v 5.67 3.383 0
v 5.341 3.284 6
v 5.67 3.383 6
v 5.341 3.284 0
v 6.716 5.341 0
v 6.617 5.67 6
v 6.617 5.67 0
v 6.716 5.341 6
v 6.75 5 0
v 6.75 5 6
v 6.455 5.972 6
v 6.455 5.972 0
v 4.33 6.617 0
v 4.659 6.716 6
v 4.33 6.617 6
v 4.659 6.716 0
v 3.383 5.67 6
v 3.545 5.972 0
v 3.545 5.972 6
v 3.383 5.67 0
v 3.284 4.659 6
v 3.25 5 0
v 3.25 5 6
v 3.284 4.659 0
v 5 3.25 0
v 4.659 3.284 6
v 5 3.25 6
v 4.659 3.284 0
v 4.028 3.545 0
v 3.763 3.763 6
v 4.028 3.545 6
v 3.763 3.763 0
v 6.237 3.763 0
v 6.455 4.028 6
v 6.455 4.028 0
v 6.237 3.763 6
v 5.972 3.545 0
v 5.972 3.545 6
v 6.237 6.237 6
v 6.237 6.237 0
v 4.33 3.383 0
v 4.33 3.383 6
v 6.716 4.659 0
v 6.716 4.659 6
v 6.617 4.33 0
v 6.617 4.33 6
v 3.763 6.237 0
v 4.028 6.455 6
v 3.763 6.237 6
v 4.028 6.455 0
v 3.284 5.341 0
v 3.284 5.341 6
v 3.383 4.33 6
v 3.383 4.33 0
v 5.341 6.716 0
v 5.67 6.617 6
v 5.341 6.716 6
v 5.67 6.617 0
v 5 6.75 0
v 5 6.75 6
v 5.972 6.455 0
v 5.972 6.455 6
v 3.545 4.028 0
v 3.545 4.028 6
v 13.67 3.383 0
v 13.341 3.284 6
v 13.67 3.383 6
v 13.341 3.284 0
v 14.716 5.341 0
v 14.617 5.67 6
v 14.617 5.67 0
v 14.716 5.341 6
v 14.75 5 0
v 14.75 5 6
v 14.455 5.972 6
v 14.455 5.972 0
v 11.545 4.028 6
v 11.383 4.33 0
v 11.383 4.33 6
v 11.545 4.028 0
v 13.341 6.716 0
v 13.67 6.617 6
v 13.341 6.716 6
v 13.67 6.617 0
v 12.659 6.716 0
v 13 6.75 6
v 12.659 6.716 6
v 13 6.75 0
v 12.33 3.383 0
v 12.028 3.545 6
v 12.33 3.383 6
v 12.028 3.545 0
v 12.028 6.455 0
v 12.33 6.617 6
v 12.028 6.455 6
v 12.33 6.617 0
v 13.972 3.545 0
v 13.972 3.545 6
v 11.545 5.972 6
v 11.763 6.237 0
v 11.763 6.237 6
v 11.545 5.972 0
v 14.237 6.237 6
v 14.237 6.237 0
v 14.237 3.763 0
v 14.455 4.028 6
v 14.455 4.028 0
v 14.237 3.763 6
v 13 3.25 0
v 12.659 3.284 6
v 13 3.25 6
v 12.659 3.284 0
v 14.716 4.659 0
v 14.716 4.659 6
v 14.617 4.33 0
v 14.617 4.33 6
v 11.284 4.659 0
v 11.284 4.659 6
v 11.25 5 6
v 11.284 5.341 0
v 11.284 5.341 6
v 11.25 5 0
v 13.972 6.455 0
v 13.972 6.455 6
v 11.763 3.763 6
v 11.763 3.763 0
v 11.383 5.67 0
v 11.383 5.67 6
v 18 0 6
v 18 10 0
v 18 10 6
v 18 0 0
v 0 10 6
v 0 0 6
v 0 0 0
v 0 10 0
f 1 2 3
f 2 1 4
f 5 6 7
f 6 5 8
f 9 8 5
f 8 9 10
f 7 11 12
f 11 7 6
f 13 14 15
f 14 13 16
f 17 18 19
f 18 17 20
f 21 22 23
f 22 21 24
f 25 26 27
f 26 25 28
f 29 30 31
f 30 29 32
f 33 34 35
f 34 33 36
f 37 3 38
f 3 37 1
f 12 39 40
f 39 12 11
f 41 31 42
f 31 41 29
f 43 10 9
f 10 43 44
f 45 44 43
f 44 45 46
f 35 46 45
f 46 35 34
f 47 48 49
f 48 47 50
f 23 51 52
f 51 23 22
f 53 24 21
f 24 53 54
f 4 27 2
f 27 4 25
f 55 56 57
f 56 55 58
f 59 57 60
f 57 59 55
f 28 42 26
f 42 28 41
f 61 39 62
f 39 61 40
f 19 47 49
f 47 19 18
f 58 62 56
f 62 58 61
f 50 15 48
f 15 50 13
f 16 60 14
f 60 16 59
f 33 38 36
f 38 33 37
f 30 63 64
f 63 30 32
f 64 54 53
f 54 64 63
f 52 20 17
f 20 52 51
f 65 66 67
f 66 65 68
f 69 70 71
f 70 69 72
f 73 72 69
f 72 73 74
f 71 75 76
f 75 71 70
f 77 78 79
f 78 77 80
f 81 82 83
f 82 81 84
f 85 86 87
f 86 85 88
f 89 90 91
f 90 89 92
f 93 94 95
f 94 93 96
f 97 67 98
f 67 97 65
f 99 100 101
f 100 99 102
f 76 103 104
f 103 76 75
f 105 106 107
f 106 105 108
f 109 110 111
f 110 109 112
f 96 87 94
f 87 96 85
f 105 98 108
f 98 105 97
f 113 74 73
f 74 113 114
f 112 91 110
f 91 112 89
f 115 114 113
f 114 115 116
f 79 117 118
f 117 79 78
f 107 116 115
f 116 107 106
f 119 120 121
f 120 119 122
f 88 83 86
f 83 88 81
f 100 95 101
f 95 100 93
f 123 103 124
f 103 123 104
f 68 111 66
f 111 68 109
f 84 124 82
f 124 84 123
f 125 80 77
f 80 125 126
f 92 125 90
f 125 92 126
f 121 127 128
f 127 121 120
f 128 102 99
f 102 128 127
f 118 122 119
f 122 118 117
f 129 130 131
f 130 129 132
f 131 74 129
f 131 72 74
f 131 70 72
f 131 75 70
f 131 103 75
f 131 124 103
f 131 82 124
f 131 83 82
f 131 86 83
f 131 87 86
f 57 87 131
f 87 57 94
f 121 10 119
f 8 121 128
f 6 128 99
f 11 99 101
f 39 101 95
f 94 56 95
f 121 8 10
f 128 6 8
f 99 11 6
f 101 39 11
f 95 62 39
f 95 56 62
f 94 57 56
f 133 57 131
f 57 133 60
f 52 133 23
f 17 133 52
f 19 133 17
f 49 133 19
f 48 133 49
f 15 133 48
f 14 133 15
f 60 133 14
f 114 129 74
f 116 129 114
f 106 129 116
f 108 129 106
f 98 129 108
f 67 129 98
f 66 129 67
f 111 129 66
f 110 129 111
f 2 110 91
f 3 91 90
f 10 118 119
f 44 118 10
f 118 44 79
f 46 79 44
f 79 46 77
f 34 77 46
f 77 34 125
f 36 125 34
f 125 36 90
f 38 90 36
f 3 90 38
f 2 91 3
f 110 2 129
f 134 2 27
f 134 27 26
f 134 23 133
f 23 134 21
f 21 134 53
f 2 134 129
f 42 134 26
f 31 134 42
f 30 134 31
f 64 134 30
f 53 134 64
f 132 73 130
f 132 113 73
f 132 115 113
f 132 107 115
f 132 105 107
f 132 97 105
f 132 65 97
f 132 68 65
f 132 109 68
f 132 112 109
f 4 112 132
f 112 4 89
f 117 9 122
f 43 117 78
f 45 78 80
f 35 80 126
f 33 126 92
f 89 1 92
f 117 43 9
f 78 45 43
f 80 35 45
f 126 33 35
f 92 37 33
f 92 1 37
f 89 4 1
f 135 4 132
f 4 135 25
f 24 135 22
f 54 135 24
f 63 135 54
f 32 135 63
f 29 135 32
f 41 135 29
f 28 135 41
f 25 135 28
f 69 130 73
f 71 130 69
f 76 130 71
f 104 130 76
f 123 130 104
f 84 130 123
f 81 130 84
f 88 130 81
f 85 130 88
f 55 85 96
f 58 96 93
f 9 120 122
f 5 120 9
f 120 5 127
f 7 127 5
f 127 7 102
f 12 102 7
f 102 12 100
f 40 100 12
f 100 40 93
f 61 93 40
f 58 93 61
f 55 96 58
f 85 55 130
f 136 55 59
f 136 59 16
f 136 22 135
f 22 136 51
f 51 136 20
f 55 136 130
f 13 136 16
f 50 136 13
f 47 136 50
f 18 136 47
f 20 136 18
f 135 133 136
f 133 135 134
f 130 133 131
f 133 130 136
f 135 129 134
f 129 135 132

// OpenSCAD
$fn = 32;

// ----------------------------------------------------------------------
// Micro pad: two-hole pad, 5-20 mm class
// ----------------------------------------------------------------------

// --- parameters (mm) ---
pad_l = 18;               // pad length, X
pad_w = 10;               // pad width, Y
pad_t = 6;                // pad thickness, Z
hole_d = 3.5;             // hole diameter
hole_x = 5;               // X of the first hole centre

difference() {
  cube([pad_l, pad_w, pad_t]);
  for (x = [hole_x, pad_l - hole_x])
    translate([x, pad_w / 2, -1])
      cylinder(h = pad_t + 2, d = hole_d);
}
